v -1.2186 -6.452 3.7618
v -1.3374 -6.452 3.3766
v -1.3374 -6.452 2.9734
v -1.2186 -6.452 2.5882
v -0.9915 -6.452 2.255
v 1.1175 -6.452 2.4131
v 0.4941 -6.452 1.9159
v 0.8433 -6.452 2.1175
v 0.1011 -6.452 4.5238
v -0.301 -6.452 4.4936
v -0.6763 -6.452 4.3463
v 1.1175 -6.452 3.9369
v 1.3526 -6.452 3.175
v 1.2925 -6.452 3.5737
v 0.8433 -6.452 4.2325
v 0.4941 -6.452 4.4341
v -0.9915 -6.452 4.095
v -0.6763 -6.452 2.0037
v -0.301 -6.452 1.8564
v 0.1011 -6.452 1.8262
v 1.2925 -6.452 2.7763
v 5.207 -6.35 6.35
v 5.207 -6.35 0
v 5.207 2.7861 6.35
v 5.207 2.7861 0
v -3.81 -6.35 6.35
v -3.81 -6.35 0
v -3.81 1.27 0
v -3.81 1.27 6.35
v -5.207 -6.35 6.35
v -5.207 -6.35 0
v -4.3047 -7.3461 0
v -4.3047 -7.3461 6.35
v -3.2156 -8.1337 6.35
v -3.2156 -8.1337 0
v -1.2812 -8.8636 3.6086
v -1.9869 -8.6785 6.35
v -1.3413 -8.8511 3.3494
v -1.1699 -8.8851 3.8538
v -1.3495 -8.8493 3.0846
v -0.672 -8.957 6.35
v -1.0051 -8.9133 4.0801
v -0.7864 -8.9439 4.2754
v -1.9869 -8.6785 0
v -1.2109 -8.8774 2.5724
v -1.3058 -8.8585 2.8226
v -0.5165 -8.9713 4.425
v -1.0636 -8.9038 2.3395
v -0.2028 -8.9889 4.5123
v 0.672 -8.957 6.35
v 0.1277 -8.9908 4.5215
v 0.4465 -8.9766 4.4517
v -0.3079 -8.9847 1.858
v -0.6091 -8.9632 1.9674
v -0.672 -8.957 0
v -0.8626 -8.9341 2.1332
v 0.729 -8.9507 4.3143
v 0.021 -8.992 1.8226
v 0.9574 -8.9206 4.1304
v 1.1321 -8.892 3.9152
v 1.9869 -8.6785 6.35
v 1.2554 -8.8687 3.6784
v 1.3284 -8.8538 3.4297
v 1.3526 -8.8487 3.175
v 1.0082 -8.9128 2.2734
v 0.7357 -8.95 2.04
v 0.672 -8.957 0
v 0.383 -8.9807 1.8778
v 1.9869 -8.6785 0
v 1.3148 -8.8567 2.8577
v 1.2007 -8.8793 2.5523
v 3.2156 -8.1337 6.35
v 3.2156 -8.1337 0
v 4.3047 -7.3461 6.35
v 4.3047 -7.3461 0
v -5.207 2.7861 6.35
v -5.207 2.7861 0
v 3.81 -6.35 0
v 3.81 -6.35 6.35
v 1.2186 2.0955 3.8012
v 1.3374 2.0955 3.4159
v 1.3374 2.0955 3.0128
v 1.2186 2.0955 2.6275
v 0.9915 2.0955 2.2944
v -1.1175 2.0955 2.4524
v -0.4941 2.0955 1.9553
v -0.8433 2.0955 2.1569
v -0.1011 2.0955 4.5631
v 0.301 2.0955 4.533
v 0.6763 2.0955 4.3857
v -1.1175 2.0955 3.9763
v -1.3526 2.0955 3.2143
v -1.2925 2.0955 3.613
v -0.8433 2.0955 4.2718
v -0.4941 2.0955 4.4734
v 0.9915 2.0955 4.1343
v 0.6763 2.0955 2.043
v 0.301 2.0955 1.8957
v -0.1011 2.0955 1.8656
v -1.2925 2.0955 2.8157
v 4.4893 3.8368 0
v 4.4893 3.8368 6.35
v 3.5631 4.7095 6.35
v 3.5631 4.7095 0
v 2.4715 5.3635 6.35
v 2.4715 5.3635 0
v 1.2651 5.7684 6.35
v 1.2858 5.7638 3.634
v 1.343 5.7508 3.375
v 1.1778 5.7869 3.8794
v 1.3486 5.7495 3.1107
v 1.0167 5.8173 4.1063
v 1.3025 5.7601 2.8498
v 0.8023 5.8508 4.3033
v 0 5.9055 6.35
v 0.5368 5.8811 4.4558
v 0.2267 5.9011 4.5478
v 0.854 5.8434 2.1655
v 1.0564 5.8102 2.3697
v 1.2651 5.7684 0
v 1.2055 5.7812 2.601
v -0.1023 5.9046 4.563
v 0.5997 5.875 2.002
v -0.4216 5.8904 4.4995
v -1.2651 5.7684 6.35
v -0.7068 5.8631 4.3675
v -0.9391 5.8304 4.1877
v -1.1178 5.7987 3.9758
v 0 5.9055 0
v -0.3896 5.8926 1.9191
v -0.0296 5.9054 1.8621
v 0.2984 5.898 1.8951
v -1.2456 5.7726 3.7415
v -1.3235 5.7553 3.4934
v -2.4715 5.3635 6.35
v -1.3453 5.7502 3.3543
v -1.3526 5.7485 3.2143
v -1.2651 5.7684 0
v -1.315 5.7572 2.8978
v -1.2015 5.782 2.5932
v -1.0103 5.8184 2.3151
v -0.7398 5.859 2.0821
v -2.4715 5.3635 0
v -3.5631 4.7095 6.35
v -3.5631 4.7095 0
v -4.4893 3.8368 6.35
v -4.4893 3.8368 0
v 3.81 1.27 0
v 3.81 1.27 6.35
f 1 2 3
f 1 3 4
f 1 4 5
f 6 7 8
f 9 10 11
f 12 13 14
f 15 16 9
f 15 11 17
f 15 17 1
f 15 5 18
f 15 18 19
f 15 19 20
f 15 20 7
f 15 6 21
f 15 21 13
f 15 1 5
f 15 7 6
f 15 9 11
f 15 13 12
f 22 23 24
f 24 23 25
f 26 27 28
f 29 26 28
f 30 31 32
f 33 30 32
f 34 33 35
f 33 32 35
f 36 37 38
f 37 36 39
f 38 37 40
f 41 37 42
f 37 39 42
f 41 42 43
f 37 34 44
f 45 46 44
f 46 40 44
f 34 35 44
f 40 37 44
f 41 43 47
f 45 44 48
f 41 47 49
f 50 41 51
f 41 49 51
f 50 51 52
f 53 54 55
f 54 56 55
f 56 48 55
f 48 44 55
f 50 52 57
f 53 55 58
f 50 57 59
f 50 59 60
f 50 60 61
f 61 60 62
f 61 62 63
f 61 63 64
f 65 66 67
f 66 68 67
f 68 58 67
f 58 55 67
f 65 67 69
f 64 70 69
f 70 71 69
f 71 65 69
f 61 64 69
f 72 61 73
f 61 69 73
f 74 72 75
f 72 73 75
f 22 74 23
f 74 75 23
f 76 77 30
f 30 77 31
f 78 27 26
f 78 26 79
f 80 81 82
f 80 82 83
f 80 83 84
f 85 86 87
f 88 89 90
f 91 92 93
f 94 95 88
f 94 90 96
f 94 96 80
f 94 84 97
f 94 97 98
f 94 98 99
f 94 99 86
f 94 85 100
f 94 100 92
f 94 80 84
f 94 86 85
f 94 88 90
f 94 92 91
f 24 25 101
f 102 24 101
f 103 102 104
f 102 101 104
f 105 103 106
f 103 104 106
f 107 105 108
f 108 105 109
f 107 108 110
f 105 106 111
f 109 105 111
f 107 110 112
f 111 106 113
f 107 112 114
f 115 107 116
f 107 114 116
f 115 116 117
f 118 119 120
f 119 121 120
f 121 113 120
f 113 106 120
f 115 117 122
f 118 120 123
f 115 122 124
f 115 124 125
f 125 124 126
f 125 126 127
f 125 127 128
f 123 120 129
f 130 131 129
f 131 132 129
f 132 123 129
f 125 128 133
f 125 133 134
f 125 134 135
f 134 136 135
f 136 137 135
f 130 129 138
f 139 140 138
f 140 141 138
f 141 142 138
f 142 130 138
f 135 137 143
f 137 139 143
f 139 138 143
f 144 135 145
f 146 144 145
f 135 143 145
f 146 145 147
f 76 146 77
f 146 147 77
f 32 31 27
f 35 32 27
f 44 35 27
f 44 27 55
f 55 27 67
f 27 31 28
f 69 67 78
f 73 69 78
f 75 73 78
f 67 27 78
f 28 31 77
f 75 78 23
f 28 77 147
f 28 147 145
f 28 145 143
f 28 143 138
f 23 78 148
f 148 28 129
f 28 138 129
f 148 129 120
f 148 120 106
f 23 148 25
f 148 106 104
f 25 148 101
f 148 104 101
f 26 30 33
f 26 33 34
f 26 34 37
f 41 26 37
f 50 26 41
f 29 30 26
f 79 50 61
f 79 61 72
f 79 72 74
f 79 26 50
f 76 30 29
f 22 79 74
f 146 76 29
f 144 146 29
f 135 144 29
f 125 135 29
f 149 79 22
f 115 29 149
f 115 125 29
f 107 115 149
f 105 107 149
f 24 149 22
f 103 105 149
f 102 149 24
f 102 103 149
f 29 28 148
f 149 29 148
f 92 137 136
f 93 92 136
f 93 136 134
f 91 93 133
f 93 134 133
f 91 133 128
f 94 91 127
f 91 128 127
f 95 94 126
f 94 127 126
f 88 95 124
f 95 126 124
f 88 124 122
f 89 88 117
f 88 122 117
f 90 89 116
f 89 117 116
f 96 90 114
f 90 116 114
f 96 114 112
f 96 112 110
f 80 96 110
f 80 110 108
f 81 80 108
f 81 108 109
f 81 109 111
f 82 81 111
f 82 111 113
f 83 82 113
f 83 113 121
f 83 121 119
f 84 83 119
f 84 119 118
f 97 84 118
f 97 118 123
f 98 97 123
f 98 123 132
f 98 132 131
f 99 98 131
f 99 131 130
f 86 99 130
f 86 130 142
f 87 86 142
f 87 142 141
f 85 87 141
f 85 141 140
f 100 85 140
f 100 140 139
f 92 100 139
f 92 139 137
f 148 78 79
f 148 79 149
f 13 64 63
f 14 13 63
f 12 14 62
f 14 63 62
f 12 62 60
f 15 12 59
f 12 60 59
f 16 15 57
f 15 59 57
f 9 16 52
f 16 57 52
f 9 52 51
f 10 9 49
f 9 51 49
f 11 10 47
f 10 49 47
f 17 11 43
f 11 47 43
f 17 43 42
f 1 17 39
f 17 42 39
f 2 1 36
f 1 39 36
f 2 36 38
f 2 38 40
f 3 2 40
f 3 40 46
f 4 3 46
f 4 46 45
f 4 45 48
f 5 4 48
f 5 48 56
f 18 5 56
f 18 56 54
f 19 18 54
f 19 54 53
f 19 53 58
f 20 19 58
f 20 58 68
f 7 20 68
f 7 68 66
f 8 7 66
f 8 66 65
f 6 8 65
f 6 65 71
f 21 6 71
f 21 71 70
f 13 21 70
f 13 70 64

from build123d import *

# Parameters (mm, degrees)
SKETCH3_W           = 7.62
SKETCH3_H           = 7.62
BOSS_EXTRUDE2_DEPTH = 6.35
SKETCH6_R           = 1.35255
CUT_EXTRUDE1_DEPTH  = 3.81
SKETCH7_R           = 1.35255
CUT_EXTRUDE2_DEPTH  = 2.54


with BuildPart() as part:
    # Sketch3 → Boss-Extrude2 (new body)
    with BuildSketch(Plane.XY):
        with BuildLine():
            Line((-5.207, 2.786051193), (-5.207, -6.35))
            ThreePointArc((-5.207, -6.35), (0, -8.992049984), (5.207, -6.35))
            Line((5.207, -6.35), (5.207, 2.786051193))
            ThreePointArc((5.207, 2.786051193), (0, 5.9055), (-5.207, 2.786051193))
        make_face()
        with Locations((0, -2.54)):
            Rectangle(SKETCH3_W, SKETCH3_H, mode=Mode.SUBTRACT)
    extrude(amount=BOSS_EXTRUDE2_DEPTH)

    # Sketch6 → Cut-Extrude1 (cut)
    with BuildSketch(Plane(origin=(0, 5.9055, 0), x_dir=(1, 0, 0), z_dir=(0, 1, 0))):
        with Locations(Location((0, -3.214346547, 0), (0, 0, 180))):
            Circle(SKETCH6_R)
    extrude(amount=-CUT_EXTRUDE1_DEPTH, mode=Mode.SUBTRACT)

    # Sketch7 → Cut-Extrude2 (cut)
    with BuildSketch(Plane(origin=(0, -8.992049984, 0), x_dir=(-1, 0, 0), z_dir=(0, -1, 0))):
        with Locations(Location((0, -3.175, 0), (0, 0, 180))):
            Circle(SKETCH7_R)
    extrude(amount=-CUT_EXTRUDE2_DEPTH, mode=Mode.SUBTRACT)


solid = part.part
